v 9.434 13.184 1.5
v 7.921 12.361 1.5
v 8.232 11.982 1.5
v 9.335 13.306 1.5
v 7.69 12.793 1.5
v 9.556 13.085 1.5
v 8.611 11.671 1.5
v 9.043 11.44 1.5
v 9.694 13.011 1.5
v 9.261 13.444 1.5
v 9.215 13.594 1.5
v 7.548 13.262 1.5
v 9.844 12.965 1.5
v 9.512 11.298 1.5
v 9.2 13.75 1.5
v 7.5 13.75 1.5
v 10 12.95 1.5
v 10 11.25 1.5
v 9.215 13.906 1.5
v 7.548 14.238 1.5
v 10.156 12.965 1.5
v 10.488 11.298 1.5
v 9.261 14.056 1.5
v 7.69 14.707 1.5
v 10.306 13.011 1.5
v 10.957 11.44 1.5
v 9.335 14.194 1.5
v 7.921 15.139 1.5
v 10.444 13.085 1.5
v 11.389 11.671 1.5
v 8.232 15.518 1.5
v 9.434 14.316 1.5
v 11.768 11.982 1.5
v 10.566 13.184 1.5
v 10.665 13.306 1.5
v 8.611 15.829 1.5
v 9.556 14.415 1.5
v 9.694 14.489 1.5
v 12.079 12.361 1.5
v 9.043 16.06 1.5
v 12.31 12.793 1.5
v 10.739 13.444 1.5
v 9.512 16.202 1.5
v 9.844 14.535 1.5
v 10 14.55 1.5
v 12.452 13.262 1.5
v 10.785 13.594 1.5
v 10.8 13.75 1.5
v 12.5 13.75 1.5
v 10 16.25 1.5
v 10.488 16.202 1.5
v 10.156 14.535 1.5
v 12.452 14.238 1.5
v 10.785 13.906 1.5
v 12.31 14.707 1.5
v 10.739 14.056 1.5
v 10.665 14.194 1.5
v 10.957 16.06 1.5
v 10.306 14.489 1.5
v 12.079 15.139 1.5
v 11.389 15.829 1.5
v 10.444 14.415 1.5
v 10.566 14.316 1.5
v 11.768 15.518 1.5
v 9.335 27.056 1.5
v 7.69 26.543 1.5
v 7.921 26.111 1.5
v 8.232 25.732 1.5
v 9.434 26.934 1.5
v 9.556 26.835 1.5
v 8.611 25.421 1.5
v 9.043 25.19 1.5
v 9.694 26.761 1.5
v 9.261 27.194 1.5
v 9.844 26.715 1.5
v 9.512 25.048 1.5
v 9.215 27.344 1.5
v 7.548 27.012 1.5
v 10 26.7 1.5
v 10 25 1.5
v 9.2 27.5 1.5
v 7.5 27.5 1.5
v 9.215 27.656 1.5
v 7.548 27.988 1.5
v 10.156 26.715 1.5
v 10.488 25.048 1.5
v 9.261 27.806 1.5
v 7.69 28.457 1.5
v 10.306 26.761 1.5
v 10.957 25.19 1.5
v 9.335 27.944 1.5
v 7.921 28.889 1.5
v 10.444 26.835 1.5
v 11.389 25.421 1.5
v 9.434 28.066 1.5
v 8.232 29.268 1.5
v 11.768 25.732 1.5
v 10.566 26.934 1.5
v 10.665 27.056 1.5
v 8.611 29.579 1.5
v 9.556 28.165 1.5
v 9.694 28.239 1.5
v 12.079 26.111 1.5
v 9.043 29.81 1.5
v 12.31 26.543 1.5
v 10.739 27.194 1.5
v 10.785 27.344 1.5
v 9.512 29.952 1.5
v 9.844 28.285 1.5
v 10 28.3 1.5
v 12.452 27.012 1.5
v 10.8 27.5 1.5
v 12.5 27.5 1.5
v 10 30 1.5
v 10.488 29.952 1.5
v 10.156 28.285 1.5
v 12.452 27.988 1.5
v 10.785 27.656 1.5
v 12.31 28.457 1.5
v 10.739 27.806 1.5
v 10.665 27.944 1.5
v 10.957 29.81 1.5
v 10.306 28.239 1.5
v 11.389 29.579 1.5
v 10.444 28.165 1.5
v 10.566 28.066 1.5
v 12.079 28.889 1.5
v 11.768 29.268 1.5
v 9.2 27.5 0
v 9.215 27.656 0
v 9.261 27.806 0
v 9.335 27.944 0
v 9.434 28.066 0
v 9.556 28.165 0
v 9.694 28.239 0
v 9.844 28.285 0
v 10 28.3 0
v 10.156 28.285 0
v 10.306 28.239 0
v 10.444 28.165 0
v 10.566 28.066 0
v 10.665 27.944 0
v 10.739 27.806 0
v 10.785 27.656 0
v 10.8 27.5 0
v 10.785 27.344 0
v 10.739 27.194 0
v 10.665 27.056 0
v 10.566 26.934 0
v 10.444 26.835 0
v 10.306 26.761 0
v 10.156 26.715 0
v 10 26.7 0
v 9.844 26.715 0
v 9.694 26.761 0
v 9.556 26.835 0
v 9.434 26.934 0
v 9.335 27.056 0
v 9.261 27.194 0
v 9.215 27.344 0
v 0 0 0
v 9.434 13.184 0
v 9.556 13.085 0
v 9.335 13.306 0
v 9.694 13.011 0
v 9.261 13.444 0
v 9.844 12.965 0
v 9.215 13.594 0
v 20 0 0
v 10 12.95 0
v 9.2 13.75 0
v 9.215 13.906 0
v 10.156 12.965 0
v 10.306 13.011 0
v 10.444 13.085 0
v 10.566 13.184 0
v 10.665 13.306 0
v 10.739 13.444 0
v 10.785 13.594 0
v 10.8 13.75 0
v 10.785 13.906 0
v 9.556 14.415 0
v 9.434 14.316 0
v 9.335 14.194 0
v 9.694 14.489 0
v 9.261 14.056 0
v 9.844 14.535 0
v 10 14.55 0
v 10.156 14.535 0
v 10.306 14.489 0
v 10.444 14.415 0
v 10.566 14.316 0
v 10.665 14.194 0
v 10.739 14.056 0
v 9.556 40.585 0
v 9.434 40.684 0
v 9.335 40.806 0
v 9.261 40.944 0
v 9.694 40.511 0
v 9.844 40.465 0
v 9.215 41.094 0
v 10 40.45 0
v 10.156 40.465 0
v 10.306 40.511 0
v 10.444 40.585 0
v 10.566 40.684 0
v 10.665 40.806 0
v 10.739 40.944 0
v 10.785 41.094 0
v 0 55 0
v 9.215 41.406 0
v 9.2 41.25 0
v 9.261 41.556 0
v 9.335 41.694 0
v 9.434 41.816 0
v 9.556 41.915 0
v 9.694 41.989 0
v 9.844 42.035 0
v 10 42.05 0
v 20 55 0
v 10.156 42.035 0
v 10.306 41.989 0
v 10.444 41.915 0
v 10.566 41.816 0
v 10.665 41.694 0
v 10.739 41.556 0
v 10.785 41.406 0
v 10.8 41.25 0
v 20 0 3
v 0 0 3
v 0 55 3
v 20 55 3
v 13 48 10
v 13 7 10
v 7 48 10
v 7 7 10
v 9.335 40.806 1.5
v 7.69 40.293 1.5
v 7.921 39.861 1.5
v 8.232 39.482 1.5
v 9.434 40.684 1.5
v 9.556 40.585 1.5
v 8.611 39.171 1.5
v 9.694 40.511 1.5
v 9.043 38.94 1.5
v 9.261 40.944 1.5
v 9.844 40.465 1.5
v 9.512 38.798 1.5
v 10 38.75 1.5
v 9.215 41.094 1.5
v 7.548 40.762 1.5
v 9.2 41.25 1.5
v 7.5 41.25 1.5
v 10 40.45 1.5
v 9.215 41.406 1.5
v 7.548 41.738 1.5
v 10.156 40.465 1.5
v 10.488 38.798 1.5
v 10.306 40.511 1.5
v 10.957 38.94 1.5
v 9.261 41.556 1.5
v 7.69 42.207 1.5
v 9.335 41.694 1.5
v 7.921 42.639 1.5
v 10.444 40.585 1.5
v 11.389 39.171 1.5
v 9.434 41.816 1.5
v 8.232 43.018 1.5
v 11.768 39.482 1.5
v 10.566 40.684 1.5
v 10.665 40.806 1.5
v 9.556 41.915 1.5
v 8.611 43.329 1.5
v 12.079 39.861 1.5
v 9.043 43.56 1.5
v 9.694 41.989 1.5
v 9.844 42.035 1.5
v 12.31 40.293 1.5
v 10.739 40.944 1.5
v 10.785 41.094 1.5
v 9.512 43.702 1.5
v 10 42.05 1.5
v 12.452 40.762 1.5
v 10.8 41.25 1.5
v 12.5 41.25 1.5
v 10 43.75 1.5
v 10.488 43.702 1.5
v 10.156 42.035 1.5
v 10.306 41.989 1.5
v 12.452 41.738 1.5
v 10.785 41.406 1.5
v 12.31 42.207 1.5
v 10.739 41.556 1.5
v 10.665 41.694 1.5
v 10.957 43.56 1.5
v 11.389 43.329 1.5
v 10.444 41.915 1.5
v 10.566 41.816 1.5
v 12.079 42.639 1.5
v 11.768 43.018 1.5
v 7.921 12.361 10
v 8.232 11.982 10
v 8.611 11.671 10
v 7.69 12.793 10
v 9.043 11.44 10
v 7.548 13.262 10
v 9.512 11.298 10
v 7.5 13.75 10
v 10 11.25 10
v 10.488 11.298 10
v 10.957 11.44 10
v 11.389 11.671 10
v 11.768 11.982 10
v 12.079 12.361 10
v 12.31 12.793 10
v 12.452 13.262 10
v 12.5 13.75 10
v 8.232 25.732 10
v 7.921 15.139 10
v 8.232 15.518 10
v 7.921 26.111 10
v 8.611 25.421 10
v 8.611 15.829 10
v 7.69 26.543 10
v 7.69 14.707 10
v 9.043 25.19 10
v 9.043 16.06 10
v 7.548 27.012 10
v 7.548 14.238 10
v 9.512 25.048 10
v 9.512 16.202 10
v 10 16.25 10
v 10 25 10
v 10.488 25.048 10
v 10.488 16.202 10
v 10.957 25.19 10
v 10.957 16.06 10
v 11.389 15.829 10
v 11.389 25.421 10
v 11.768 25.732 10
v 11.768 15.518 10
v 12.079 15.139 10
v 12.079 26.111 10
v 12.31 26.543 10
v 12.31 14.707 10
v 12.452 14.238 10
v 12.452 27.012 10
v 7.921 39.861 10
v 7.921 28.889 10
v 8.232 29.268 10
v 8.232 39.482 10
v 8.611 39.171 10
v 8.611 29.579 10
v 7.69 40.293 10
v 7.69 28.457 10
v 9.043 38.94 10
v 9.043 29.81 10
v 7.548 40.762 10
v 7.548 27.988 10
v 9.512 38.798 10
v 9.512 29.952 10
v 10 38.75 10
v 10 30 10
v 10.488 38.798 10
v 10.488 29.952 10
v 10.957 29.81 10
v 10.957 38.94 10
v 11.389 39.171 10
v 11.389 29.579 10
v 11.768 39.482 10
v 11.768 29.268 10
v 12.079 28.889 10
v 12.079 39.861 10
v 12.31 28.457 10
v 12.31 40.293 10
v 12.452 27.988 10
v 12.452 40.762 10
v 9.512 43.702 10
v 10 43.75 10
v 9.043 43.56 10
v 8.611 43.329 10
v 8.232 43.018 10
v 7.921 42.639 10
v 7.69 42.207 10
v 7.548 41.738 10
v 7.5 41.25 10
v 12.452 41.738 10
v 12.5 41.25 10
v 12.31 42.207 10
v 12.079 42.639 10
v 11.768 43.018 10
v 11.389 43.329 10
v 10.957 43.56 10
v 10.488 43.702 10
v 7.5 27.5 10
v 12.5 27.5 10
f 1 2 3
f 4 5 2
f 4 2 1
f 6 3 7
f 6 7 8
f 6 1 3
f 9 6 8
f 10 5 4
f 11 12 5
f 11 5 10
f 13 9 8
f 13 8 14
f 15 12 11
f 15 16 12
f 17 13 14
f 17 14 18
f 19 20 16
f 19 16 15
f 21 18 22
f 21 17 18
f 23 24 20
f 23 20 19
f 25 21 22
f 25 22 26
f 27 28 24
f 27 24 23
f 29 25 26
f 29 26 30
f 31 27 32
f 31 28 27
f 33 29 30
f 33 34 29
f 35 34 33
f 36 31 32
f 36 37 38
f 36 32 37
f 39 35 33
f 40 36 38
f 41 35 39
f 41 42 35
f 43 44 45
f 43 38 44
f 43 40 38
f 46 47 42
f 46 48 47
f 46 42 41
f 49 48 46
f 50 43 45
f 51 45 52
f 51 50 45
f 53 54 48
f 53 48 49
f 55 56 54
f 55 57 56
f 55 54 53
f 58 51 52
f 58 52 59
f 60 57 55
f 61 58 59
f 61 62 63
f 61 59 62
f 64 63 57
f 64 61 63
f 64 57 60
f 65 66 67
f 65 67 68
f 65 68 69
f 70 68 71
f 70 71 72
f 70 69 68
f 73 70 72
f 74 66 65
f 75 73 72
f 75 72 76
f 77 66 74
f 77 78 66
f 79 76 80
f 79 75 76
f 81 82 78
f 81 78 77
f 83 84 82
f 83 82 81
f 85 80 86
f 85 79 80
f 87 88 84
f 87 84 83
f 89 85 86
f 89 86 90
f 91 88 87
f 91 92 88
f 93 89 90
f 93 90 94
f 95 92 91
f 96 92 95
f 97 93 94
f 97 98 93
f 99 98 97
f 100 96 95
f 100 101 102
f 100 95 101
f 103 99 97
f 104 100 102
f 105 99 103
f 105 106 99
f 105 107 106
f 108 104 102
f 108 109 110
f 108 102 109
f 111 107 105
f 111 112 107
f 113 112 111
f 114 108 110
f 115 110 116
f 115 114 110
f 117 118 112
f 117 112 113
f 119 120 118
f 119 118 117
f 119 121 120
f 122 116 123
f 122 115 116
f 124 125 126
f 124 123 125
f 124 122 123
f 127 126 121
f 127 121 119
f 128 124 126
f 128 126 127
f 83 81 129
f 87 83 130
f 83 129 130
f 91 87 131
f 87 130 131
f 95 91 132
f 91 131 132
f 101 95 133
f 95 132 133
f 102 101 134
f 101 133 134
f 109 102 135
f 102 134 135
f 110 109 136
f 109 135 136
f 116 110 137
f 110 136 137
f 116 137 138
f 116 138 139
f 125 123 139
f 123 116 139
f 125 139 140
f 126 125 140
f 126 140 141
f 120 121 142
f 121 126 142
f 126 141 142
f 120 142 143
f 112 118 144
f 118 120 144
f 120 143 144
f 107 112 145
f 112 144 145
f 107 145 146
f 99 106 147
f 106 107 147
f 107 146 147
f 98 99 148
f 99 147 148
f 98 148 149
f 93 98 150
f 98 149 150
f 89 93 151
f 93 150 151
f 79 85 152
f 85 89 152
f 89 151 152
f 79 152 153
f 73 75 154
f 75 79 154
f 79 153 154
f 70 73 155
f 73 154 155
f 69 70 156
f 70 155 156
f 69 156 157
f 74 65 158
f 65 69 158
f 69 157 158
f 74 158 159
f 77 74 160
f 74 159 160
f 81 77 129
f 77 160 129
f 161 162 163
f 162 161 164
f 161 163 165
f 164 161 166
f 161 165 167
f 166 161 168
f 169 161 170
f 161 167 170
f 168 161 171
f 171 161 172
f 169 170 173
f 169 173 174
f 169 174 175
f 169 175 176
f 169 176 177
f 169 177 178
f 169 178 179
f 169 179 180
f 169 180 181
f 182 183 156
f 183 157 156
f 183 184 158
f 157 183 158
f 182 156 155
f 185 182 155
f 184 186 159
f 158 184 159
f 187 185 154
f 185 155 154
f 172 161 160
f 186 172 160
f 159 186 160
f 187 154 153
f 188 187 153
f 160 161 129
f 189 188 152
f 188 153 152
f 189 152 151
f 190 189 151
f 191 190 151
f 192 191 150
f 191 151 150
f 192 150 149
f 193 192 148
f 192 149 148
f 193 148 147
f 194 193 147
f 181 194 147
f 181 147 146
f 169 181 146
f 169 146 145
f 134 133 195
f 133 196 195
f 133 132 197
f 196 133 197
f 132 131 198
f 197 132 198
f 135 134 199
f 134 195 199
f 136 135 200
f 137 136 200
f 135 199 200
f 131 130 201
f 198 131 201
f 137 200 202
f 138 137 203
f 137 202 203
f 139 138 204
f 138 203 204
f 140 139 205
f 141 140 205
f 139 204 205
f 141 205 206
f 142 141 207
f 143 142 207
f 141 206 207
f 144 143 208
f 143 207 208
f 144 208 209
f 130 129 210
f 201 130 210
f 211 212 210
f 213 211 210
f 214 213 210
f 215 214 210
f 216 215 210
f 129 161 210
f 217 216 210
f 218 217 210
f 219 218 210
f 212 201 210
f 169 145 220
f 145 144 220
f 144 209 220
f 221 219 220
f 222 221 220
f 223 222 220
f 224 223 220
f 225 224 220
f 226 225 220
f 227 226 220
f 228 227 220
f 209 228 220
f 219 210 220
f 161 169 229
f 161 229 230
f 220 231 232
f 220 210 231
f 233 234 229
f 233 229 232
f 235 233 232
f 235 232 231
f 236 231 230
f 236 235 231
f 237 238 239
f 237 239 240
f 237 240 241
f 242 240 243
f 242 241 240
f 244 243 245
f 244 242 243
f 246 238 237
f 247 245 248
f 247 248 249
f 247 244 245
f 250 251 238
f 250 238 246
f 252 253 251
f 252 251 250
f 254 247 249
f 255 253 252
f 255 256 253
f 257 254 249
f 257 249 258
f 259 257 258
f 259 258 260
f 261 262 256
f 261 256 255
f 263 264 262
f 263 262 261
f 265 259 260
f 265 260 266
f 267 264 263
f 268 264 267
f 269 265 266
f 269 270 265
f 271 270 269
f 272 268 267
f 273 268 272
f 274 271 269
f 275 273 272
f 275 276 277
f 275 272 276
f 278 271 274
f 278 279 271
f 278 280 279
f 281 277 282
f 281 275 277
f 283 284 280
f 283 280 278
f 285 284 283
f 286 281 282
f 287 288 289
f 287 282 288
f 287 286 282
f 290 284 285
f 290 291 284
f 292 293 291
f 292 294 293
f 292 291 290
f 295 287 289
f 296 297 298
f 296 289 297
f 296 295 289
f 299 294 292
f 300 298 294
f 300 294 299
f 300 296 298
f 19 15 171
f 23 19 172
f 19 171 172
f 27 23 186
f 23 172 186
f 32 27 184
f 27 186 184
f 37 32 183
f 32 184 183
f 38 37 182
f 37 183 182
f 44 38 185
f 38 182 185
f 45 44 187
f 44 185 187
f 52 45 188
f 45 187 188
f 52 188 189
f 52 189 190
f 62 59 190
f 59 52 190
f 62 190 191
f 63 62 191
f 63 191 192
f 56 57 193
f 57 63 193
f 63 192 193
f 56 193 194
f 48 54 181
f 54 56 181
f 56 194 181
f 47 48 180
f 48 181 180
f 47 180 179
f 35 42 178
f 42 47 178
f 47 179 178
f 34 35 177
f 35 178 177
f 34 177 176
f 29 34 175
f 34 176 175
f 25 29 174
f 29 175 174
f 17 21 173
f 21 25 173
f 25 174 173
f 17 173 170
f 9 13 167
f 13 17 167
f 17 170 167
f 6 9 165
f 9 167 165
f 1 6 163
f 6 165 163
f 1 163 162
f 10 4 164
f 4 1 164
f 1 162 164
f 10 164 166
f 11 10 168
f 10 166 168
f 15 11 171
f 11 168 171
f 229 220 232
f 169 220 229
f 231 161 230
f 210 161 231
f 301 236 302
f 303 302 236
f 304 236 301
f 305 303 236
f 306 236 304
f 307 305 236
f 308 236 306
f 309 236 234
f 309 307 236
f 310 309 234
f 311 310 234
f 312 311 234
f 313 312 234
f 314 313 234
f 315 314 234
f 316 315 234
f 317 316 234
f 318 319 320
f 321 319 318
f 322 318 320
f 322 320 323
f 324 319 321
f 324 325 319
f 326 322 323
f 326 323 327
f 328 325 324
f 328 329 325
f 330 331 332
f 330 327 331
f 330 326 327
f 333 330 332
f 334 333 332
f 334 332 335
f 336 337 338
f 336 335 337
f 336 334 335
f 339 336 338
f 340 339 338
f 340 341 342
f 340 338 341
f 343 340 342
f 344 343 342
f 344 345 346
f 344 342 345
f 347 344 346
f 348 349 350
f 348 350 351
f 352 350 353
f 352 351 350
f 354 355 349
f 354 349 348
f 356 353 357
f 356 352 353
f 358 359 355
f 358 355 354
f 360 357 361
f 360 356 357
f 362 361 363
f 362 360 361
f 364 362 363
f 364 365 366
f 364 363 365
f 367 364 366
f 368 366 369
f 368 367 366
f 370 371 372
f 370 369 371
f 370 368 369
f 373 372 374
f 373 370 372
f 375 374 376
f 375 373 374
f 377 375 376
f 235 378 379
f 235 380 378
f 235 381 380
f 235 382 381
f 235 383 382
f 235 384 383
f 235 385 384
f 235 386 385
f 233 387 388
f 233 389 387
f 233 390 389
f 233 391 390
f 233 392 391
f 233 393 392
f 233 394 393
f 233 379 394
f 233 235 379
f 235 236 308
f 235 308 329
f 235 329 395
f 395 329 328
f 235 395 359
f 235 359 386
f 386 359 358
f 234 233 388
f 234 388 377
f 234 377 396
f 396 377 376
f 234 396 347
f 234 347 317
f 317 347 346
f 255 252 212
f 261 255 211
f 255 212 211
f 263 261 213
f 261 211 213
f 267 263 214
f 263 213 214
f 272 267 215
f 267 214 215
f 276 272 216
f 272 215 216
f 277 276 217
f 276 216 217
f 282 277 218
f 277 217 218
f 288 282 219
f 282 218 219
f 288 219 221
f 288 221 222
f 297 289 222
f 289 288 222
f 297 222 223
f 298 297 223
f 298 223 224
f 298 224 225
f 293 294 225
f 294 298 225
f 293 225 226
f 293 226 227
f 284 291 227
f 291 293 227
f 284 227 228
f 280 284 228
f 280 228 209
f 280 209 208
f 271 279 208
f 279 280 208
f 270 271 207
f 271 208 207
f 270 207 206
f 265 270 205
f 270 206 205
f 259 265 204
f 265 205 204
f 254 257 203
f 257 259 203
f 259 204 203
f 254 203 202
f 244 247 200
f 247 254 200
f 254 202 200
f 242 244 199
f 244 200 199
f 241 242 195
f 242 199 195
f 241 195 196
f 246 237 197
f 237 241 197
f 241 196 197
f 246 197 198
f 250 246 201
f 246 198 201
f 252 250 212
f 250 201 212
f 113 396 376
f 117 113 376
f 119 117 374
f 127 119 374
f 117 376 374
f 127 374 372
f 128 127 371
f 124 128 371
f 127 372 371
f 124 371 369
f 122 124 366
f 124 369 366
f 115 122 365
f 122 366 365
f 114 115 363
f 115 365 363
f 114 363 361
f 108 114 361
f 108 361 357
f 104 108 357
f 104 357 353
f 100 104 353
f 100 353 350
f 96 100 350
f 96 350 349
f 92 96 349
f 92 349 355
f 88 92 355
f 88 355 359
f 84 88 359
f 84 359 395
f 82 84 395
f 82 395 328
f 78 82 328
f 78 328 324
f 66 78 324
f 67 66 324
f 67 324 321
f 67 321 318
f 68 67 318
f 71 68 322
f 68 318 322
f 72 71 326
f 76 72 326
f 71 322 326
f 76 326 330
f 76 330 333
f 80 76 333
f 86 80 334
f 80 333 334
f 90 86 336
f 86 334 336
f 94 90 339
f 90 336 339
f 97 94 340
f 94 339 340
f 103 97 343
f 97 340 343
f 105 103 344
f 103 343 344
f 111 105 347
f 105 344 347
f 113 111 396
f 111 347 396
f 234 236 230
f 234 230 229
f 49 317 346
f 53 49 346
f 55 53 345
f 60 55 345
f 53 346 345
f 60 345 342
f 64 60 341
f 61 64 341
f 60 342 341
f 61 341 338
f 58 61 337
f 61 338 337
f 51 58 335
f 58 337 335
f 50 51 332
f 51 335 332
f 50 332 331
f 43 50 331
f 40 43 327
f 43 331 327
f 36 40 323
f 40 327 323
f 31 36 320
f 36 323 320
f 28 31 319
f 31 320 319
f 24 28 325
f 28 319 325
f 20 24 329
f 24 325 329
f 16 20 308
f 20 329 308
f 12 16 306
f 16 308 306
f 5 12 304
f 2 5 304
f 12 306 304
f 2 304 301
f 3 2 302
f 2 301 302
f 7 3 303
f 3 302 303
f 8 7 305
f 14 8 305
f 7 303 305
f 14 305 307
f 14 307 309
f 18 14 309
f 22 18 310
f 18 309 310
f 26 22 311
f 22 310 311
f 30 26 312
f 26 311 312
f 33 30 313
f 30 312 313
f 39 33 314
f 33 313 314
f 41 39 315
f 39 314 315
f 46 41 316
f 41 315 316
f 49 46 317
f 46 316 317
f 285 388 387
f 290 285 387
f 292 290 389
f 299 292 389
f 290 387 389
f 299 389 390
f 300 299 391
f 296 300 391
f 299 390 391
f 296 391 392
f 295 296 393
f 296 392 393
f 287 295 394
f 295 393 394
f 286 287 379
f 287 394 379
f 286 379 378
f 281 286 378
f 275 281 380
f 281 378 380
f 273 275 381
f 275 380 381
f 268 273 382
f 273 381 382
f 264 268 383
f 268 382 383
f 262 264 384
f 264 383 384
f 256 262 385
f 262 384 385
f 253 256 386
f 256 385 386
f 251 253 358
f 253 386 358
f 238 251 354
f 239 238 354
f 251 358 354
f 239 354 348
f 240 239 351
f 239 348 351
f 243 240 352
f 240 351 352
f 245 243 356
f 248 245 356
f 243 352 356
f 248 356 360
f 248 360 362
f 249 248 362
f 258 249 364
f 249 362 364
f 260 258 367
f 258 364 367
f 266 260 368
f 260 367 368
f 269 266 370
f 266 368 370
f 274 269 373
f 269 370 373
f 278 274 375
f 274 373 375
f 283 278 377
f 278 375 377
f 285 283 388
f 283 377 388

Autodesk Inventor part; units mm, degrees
ref_plane "YZ Plane" through (0, 0, 0) normal (1, 0, 0) x (0, 1, 0)
ref_plane "XZ Plane" through (0, 0, 0) normal (0, 1, 0) x (-1, 0, 0)
ref_plane "XY Plane" through (0, 0, 0) normal (0, 0, 1) x (1, 0, 0)
sketch "スケッチ1" plane through (0, 0, 0) normal (0, 0, 1) x (1, 0, 0)
  line L0 (0, 55) -> (20, 55)
  line L1 (20, 55) -> (20, 0)
  line L2 (20, 0) -> (0, 0)
  line L3 (0, 0) -> (0, 55)
  dimension "d0" = 20
  dimension "d1" = 55
extrude "押し出し1" add sketch "スケッチ1" along normal blind 10
chamfer "面取り1" distance 7 angle 45 4 edges at (20, 27.5, 10) (0, 27.5, 10) (10, 55, 10) (10, 0, 10)
sketch "スケッチ2" plane through (0, 0, 0) normal (0, 0, -1) x (-1, 0, 0)
  line L0 (0, 0) -> (-20, 0) projected
  line L1 (0, 55) -> (0, 0) projected
  line L2 (-20, 55) -> (0, 55) projected
  line L3 (-20, 0) -> (-20, 55) projected
  circle A0 centre (-10, 41.25) radius 0.8
  circle A1 centre (-10, 13.75) radius 0.8
  circle A2 centre (-10, 27.5) radius 0.8
  point P0 (-10, 55)
  dimension "d7" = 1.6
  dimension "d8" = 1.6
  dimension "d9" = 1.6
  dimension "d10" = 13.75
  dimension "d11" = 13.75
  dimension "d12" = 13.75
  dimension "d13" = 13.75
extrude "押し出し2" cut sketch "スケッチ2" against normal through all contours A0 | A1 | A2
sketch "スケッチ3" plane through (0, 0, 10) normal (0, 0, 1) x (1, 0, 0)
  circle A0 centre (10, 41.25) radius 0.8 projected
  circle A1 centre (10, 27.5) radius 0.8 projected
  circle A2 centre (10, 13.75) radius 0.8 projected
  circle A3 centre (10, 27.5) radius 0.8 projected
  circle A4 centre (10, 41.25) radius 0.8 projected
  line L0 (7, 7) -> (7, 48) projected
  line L1 (13, 7) -> (7, 7) projected
  line L2 (13, 48) -> (13, 7) projected
  line L3 (7, 48) -> (13, 48) projected
  circle A5 centre (10, 41.25) radius 2.5
  circle A6 centre (10, 27.5) radius 2.5
  circle A7 centre (10, 13.75) radius 2.5
  point P0 (0, 0)
  dimension "d16" = 5
  dimension "d17" = 5
  dimension "d18" = 5
extrude "押し出し3" cut sketch "スケッチ3" against normal blind 8.5 contours A5 | A6 | A7
equation "\"d10\" = d13"
equation "\"d11\" = d13"
equation "\"d12\" = d13"
properties part number "shield"
